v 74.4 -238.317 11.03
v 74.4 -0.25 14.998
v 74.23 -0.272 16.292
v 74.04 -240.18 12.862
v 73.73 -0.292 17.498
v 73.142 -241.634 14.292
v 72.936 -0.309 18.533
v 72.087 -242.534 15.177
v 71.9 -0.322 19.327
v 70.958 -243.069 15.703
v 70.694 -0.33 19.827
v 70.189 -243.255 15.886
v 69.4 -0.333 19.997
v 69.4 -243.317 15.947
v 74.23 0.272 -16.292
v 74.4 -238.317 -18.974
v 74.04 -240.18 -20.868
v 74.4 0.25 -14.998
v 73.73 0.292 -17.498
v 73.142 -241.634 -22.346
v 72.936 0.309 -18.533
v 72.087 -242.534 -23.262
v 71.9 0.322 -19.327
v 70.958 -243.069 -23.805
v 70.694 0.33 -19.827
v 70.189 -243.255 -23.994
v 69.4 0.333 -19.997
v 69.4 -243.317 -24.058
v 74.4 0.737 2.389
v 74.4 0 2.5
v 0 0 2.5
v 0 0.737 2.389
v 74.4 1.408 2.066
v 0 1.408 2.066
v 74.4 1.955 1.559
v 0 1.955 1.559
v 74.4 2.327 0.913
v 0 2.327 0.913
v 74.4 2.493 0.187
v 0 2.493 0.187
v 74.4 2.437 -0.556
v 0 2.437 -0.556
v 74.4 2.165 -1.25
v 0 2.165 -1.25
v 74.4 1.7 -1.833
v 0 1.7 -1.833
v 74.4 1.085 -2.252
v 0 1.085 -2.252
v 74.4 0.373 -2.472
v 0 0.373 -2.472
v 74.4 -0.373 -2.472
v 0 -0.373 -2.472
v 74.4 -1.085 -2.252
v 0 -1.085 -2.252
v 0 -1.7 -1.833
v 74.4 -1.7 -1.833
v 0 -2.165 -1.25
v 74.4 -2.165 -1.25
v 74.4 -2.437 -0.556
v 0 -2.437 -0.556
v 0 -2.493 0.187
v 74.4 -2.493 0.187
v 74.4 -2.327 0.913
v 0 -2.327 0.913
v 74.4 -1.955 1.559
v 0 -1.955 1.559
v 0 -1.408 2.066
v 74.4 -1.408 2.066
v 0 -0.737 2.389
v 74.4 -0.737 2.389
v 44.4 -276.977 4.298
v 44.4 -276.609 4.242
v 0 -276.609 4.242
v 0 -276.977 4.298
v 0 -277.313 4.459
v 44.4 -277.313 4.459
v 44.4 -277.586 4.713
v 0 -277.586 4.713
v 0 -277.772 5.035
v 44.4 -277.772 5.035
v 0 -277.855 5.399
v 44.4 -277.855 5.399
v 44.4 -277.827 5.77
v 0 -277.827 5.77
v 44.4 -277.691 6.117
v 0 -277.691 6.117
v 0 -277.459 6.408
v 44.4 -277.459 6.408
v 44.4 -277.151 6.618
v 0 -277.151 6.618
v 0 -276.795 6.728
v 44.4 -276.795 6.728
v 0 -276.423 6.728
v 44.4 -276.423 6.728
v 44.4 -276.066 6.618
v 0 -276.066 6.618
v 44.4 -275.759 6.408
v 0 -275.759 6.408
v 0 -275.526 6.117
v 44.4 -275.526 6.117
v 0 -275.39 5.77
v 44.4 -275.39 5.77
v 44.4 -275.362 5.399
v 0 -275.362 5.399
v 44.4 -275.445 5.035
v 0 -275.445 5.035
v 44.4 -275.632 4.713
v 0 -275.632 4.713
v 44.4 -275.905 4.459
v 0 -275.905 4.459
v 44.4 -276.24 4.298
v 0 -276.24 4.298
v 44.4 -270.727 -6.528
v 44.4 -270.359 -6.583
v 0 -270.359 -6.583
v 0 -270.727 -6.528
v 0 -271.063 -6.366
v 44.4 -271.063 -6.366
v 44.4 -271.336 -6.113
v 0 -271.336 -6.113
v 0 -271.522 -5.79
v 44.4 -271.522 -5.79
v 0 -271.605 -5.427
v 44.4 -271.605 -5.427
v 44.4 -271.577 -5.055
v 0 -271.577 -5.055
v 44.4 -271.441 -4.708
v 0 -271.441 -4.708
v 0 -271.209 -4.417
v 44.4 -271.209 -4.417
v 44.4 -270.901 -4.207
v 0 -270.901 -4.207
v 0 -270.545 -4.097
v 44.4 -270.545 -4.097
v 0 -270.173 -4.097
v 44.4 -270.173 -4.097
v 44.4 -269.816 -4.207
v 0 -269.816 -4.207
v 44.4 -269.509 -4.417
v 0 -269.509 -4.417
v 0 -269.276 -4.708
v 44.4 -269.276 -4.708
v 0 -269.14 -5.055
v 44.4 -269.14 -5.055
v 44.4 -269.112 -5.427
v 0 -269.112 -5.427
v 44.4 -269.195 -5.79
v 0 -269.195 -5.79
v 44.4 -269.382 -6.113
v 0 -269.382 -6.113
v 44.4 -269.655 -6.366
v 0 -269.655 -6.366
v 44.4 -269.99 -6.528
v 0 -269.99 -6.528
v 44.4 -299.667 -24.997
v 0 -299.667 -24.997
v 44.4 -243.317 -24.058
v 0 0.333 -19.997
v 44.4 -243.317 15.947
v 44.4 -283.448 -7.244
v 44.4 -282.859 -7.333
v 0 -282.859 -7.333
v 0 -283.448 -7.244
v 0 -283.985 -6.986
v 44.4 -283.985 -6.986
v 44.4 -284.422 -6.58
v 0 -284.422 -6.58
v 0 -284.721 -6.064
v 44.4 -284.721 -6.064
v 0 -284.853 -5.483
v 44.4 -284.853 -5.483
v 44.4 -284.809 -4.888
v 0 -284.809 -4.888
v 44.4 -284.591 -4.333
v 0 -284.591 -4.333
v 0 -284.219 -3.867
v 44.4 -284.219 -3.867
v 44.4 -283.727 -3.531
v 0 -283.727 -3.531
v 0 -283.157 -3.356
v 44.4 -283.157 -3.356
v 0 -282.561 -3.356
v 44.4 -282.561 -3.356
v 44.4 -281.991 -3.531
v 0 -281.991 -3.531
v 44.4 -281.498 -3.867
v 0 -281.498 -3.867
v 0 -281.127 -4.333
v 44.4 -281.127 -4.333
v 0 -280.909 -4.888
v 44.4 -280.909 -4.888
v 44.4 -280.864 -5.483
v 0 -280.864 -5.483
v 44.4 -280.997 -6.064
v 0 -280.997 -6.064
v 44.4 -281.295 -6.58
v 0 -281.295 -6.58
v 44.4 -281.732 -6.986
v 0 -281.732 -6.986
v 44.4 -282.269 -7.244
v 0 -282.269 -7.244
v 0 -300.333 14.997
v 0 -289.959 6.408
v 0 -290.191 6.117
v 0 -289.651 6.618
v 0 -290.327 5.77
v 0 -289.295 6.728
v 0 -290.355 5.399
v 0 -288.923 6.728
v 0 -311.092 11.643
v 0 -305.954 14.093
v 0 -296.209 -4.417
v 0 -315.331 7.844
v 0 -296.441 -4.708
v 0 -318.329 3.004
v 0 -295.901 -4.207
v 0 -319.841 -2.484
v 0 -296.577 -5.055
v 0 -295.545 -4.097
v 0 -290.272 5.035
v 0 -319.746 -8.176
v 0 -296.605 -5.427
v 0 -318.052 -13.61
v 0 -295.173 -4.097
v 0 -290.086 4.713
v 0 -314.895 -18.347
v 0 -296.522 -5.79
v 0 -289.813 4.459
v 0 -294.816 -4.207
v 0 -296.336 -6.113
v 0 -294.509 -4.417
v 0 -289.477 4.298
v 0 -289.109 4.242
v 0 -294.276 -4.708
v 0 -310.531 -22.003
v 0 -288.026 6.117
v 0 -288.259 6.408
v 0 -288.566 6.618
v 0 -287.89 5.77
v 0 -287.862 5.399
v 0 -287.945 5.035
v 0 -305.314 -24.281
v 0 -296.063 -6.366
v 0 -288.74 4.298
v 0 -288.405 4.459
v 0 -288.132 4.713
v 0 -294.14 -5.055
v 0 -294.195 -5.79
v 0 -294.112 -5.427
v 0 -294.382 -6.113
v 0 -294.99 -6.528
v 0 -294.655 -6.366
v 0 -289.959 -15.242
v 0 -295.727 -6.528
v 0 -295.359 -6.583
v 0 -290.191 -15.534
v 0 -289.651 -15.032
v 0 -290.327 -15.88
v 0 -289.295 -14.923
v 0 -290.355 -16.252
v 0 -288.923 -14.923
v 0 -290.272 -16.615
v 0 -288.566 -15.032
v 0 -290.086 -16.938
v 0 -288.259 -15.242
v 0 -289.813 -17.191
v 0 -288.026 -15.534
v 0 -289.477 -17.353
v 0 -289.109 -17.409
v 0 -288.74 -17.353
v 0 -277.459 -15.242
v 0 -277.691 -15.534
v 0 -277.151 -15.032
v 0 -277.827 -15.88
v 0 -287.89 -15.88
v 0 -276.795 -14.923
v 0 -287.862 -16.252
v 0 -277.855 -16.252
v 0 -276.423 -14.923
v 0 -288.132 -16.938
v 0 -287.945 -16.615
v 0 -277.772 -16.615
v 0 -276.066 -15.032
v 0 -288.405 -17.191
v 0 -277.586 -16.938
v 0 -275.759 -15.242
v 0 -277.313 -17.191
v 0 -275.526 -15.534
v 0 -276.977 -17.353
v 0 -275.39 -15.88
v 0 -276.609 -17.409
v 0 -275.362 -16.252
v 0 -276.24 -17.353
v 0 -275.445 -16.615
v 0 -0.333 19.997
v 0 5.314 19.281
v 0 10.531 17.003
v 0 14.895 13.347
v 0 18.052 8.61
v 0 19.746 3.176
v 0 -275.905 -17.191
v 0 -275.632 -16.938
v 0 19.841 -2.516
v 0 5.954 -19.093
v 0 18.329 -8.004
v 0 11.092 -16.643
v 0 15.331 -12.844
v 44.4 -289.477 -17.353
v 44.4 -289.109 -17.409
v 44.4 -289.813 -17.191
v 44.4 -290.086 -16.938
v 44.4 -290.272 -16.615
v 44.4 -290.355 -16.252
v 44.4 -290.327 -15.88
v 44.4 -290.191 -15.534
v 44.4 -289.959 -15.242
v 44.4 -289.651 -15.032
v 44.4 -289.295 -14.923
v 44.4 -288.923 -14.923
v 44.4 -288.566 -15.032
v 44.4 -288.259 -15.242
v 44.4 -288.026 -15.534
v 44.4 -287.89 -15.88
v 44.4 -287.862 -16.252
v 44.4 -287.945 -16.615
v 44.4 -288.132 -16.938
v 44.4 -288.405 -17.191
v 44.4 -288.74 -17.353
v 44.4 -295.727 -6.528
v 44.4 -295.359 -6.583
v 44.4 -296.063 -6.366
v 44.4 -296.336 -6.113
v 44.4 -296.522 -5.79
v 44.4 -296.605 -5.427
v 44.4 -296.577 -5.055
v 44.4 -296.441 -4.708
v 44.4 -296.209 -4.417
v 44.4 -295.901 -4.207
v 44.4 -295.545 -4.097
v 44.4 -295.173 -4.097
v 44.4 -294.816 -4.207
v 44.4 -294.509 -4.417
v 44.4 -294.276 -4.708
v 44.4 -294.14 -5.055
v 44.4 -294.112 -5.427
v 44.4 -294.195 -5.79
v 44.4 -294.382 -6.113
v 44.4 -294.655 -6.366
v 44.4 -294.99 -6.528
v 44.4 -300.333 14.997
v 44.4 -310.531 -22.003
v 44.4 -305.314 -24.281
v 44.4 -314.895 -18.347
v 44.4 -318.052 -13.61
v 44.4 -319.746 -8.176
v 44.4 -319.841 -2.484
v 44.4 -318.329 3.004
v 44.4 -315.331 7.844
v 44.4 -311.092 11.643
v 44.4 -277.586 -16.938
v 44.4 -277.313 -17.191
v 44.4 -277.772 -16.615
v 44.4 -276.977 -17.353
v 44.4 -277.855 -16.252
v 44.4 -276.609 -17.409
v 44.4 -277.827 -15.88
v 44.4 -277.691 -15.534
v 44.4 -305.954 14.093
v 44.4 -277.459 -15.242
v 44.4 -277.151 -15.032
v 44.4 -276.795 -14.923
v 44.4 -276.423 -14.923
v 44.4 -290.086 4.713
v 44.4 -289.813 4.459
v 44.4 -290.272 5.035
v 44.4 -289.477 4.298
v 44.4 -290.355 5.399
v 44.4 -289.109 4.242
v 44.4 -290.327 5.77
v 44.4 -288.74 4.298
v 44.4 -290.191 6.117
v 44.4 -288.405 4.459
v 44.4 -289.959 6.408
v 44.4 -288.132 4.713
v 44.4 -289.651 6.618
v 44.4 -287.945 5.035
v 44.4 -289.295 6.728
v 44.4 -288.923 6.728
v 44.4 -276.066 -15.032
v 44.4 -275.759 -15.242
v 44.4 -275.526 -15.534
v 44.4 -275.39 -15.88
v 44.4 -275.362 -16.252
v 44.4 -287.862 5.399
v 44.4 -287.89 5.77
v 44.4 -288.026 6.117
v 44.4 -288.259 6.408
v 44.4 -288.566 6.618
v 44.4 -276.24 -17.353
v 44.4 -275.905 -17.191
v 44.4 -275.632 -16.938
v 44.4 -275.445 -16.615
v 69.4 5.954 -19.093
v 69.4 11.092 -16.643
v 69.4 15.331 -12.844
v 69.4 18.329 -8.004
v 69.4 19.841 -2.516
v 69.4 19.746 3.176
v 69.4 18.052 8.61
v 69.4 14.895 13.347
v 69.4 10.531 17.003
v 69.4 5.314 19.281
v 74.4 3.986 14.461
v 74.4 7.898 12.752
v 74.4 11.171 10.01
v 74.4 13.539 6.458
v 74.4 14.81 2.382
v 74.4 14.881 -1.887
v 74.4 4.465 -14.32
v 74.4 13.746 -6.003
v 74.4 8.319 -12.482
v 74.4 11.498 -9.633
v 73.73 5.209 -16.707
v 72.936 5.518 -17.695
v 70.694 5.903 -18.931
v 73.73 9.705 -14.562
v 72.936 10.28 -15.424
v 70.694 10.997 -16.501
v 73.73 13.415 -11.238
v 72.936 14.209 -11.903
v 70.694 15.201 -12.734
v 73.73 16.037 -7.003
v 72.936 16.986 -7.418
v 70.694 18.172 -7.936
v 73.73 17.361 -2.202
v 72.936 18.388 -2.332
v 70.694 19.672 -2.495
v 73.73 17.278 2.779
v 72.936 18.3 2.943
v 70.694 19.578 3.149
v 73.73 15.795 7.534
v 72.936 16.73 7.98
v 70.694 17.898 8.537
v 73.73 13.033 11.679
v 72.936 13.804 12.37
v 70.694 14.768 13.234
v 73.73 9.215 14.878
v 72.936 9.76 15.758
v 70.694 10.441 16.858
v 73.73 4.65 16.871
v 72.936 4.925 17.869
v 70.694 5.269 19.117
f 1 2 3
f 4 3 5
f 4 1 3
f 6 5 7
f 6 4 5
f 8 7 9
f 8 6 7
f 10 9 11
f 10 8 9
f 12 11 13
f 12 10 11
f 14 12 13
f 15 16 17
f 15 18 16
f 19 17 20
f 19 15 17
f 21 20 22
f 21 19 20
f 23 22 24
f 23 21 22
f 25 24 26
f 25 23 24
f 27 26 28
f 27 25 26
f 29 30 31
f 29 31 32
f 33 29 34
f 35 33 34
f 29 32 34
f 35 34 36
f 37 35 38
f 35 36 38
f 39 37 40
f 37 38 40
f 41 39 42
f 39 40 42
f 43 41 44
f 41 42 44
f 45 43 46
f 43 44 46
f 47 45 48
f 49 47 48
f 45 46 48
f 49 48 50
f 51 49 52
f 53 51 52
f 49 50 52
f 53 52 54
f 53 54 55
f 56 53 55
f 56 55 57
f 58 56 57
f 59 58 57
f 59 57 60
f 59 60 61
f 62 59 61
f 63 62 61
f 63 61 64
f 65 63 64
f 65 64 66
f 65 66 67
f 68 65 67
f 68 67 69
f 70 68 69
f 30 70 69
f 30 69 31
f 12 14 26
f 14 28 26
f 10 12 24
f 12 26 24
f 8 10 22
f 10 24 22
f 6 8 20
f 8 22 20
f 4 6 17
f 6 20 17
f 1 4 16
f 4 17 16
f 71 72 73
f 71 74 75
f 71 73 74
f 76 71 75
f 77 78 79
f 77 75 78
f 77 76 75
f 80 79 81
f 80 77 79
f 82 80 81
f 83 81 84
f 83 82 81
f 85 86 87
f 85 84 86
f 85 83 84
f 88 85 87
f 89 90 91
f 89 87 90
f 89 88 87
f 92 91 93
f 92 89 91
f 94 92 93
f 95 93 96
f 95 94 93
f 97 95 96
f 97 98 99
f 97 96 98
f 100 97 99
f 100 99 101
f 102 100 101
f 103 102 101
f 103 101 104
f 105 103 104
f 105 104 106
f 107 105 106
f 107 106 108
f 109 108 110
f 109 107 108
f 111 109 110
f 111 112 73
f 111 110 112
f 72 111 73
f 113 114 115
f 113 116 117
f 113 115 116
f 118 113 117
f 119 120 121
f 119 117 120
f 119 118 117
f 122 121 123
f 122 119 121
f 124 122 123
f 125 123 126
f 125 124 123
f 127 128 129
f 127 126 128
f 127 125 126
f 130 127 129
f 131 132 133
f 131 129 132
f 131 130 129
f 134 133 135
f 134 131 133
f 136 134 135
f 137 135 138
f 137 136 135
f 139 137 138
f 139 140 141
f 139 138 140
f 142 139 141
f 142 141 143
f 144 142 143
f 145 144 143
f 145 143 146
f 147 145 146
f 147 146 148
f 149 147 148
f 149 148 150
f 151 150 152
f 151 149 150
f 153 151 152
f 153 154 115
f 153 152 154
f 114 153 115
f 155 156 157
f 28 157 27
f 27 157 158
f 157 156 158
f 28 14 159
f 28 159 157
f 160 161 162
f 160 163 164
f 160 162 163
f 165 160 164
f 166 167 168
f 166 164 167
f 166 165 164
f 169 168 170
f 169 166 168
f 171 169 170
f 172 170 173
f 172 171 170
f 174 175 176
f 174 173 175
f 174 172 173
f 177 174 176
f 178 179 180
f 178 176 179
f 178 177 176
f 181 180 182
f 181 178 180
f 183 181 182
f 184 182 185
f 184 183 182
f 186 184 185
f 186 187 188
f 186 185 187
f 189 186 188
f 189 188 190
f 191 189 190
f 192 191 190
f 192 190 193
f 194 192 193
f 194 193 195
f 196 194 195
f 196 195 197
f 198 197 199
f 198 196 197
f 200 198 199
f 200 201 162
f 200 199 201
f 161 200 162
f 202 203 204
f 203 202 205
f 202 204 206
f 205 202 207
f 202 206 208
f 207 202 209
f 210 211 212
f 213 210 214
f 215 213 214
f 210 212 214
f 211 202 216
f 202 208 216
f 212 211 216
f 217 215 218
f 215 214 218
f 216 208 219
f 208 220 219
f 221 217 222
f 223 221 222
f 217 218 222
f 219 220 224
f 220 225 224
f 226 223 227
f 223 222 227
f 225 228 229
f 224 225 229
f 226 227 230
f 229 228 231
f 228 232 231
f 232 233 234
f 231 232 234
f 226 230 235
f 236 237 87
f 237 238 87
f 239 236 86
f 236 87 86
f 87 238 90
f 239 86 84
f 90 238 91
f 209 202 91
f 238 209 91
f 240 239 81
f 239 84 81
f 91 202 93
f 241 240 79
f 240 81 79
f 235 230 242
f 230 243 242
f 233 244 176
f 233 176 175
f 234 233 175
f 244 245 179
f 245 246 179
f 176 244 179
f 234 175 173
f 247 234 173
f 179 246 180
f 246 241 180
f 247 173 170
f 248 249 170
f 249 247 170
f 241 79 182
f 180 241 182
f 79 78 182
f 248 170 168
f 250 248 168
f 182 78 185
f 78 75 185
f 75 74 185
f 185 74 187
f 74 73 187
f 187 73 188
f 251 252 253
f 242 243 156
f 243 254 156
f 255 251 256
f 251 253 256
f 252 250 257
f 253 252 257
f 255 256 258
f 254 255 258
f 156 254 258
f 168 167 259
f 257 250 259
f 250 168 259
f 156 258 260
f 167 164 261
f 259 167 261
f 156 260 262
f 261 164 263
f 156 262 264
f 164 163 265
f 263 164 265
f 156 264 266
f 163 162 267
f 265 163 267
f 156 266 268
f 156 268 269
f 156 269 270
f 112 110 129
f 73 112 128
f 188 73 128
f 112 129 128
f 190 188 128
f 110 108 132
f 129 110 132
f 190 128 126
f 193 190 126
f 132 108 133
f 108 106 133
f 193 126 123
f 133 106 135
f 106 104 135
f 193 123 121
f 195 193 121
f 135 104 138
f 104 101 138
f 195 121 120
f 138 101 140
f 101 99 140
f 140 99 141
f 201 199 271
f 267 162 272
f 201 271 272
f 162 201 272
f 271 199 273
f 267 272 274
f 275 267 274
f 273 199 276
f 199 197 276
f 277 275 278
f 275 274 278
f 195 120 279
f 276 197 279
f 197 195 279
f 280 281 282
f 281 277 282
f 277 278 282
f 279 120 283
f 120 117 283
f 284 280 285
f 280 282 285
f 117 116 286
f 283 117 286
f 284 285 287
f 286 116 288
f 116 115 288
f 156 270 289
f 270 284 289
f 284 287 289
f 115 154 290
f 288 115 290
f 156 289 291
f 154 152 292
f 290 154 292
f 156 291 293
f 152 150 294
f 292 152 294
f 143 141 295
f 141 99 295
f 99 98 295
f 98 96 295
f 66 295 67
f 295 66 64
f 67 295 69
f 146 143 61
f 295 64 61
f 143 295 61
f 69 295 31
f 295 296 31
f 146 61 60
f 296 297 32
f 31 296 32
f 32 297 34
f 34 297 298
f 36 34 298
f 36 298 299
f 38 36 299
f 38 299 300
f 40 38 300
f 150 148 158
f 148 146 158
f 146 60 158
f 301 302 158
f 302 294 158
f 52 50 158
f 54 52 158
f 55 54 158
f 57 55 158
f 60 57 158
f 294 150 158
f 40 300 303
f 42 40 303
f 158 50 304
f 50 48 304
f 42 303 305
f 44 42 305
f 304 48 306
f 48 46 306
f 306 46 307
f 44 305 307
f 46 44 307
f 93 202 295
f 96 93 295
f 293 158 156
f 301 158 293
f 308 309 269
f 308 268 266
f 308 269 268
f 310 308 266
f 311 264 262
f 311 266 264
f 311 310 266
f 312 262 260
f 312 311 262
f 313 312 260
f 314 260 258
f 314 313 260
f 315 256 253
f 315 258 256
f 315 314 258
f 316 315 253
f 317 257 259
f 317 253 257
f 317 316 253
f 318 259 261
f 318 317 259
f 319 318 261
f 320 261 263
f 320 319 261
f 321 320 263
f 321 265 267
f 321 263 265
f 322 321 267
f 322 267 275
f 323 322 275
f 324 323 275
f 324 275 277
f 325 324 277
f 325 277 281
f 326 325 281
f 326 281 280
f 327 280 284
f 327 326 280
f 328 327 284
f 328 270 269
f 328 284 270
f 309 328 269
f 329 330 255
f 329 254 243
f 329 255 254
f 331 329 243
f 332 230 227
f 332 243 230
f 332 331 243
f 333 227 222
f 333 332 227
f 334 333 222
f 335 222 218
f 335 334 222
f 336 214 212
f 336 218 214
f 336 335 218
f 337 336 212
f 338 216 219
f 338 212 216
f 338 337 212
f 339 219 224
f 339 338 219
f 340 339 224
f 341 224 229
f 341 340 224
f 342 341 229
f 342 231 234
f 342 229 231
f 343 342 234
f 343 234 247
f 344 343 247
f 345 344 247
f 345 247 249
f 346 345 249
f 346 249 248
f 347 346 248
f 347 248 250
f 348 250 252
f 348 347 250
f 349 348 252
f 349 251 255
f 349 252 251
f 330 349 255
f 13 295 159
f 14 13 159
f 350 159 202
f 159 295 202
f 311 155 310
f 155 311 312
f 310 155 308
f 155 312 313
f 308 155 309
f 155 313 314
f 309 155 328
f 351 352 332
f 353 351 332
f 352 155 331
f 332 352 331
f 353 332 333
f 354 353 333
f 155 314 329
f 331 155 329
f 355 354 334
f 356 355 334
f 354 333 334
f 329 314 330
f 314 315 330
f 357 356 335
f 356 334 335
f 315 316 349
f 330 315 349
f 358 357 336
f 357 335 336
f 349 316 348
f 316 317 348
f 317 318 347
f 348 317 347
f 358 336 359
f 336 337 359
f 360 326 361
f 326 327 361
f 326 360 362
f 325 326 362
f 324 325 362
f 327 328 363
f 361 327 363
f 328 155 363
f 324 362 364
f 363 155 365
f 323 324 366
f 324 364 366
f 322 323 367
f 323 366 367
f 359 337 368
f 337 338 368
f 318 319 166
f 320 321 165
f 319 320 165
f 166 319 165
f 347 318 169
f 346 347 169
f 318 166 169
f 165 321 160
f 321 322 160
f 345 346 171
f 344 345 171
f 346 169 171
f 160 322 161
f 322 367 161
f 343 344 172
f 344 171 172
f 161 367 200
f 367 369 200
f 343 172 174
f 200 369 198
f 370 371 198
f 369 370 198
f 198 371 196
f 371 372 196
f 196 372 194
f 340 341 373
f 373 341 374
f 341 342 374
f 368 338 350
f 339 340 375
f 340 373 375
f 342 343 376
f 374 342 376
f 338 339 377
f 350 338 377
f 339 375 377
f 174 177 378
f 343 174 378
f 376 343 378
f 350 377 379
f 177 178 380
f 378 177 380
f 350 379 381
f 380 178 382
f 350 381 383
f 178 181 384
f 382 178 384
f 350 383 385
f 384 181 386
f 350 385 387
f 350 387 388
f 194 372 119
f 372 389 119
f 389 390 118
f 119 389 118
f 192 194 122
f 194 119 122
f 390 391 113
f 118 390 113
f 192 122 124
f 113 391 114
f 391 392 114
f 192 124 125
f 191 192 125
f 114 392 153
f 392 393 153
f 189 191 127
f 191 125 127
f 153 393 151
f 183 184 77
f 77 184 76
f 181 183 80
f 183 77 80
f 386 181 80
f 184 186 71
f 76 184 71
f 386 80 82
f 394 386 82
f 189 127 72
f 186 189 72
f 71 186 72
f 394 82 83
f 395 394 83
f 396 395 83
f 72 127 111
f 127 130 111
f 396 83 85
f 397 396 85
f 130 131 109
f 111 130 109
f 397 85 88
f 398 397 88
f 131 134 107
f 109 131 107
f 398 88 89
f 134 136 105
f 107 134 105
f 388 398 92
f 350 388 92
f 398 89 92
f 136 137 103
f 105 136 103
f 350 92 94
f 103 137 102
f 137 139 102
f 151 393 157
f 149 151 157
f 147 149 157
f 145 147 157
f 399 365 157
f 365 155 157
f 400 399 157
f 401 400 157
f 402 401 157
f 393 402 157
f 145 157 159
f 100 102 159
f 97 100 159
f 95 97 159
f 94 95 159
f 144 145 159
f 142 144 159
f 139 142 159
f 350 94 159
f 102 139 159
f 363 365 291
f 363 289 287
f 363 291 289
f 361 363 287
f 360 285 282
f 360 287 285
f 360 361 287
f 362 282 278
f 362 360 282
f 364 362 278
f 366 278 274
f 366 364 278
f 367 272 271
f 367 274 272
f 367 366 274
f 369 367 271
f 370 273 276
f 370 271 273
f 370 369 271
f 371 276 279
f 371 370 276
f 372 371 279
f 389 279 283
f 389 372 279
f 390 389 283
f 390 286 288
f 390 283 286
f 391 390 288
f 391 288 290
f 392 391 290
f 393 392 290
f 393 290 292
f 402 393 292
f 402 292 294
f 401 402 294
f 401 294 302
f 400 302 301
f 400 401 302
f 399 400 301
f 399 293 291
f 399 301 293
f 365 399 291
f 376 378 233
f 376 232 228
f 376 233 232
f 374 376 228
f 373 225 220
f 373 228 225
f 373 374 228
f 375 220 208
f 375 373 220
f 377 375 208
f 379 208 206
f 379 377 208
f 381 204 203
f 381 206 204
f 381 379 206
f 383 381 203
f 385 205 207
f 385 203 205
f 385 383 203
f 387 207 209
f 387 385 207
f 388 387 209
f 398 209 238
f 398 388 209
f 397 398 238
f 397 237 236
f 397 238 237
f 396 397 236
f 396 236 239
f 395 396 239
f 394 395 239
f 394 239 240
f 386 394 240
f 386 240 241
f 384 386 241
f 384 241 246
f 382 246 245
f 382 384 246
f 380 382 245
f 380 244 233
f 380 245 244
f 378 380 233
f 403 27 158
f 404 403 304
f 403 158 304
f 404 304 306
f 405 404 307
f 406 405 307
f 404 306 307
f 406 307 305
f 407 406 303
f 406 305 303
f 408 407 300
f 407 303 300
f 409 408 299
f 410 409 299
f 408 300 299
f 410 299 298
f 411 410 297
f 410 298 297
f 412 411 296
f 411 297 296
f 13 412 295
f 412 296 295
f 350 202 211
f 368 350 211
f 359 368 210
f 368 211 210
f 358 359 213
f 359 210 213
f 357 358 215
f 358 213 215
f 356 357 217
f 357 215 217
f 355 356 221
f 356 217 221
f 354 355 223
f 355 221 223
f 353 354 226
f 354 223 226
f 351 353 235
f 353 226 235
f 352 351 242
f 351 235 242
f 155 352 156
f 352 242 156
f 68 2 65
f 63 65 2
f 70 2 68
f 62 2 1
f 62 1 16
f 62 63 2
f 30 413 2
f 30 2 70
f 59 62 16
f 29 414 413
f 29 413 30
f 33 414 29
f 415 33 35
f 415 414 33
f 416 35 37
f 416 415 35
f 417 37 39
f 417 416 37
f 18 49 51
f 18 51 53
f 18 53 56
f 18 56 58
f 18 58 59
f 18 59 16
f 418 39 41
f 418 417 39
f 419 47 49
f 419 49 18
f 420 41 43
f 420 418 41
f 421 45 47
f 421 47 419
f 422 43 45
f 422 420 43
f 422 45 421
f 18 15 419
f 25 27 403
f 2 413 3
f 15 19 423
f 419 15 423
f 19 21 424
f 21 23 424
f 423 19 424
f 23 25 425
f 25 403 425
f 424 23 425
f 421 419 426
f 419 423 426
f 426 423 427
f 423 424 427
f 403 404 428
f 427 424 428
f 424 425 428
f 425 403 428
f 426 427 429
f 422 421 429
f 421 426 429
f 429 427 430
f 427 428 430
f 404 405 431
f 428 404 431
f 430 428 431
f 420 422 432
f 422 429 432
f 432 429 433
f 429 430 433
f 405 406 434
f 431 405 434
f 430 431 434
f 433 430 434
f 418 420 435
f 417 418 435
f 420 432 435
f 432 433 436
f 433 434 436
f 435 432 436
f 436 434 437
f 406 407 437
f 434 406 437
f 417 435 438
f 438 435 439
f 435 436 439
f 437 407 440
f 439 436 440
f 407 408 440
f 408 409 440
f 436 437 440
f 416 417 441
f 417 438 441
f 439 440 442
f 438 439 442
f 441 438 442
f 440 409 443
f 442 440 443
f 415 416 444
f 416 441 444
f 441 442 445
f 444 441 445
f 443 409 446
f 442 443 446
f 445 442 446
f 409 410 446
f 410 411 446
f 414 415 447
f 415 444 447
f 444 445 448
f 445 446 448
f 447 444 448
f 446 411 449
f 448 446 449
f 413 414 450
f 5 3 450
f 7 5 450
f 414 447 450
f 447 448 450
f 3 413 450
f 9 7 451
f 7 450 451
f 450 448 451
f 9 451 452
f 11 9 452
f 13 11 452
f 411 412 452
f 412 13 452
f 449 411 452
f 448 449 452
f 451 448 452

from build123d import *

# Parameters (mm, degrees)
EXTRUDE_3_DEPTH          = 74.4
CUT_EXTRUDE_1_DEPTH      = 30
FILLET_1_R               = 5
CUT_EXTRUDE_6_DEPTH      = 330.484992071
CUT_EXTRUDE_6_DEPTH_BACK = 330.484992071
SKETCH_13_R              = 1.25
CUT_EXTRUDE_7_DEPTH      = 330.484992071
CUT_EXTRUDE_7_DEPTH_BACK = 330.484992071
SKETCH_14_R              = 2
SKETCH_15_R              = 2.5
CUT_EXTRUDE_8_DEPTH      = 100


with BuildPart() as part:
    # 草图4 → 凸台-拉伸3 (new body)
    with BuildSketch(Plane(origin=(0, 0, 0), x_dir=(0, 0, -1), z_dir=(1, 0, 0))):
        with BuildLine():
            Line((-19.997222801, -0.333287047), (-14.997222801, -300.333287047))
            ThreePointArc((-14.997222801, -300.333287047), (5.333287047, -319.997222801), (24.997222801, -299.666712953))
            Line((24.997222801, -299.666712953), (19.997222801, 0.333287047))
            ThreePointArc((19.997222801, 0.333287047), (-0.333287047, 19.997222801), (-19.997222801, -0.333287047))
        make_face()
    extrude(amount=EXTRUDE_3_DEPTH)

    # 草图8 → 切除-拉伸1 (cut)
    with BuildSketch(Plane(origin=(74.4, 0, 0), x_dir=(0, 0, -1), z_dir=(1, 0, 0))):
        with BuildLine():
            Line((-15.947486862, -243.317443397), (24.058068308, -243.317443397))
            Line((24.058068308, -243.317443397), (24.997222801, -299.666712953))
            ThreePointArc((24.997222801, -299.666712953), (4.858283924, -320.480273081), (-15.947486862, -300.333287047))
            Line((-15.947486862, -300.333287047), (-15.947486862, -243.317443397))
        make_face()
    extrude(amount=-CUT_EXTRUDE_1_DEPTH, mode=Mode.SUBTRACT)

    # 圆角1
    fillet_1_edges = [part.edges().sort_by_distance(p)[0] for p in [
        (74.4, -121.492078175, -22.027645554),
        (74.4, -243.317443397, -4.055290723),
        (74.4, 19.997222801, 0.333287047),
        (74.4, -121.825365222, 17.972354831),
    ]]
    fillet(fillet_1_edges, radius=FILLET_1_R)

    # 草图13 → 切除-拉伸6 (cut, two sides: drawn at the far end of the back side and taken through both)
    with BuildSketch(Plane.ZY.offset(-CUT_EXTRUDE_6_DEPTH_BACK)):
        with Locations(Location((-5.333287046, -270.358832161, 0), (0, 0, 180))):
            Circle(SKETCH_13_R)
        with Locations(Location((5.492030501, -276.608832161, 0), (0, 0, 180))):
            Circle(SKETCH_13_R)
        with Locations(Location((5.492030501, -289.108832161, 0), (0, 0, 180))):
            Circle(SKETCH_13_R)
        with Locations(Location((-5.333287046, -295.358832161, 0), (0, 0, 180))):
            Circle(SKETCH_13_R)
        with Locations(Location((-16.158604593, -289.108832161, 0), (0, 0, 180))):
            Circle(SKETCH_13_R)
        with Locations(Location((-16.158604593, -276.608832161, 0), (0, 0, 180))):
            Circle(SKETCH_13_R)
    extrude(amount=CUT_EXTRUDE_6_DEPTH + CUT_EXTRUDE_6_DEPTH_BACK, mode=Mode.SUBTRACT)

    # 草图14 → 切除-拉伸7 (cut, two sides: drawn at the far end of the back side and taken through both)
    with BuildSketch(Plane.ZY.offset(-CUT_EXTRUDE_7_DEPTH_BACK)):
        with Locations(Location((-5.333287046, -282.858832161, 0), (0, 0, 180))):
            Circle(SKETCH_14_R)
    extrude(amount=CUT_EXTRUDE_7_DEPTH + CUT_EXTRUDE_7_DEPTH_BACK, mode=Mode.SUBTRACT)

    # 草图15 → 切除-拉伸8 (cut)
    with BuildSketch(Plane.ZY):
        Circle(SKETCH_15_R)
    extrude(amount=-CUT_EXTRUDE_8_DEPTH, mode=Mode.SUBTRACT)


solid = part.part
